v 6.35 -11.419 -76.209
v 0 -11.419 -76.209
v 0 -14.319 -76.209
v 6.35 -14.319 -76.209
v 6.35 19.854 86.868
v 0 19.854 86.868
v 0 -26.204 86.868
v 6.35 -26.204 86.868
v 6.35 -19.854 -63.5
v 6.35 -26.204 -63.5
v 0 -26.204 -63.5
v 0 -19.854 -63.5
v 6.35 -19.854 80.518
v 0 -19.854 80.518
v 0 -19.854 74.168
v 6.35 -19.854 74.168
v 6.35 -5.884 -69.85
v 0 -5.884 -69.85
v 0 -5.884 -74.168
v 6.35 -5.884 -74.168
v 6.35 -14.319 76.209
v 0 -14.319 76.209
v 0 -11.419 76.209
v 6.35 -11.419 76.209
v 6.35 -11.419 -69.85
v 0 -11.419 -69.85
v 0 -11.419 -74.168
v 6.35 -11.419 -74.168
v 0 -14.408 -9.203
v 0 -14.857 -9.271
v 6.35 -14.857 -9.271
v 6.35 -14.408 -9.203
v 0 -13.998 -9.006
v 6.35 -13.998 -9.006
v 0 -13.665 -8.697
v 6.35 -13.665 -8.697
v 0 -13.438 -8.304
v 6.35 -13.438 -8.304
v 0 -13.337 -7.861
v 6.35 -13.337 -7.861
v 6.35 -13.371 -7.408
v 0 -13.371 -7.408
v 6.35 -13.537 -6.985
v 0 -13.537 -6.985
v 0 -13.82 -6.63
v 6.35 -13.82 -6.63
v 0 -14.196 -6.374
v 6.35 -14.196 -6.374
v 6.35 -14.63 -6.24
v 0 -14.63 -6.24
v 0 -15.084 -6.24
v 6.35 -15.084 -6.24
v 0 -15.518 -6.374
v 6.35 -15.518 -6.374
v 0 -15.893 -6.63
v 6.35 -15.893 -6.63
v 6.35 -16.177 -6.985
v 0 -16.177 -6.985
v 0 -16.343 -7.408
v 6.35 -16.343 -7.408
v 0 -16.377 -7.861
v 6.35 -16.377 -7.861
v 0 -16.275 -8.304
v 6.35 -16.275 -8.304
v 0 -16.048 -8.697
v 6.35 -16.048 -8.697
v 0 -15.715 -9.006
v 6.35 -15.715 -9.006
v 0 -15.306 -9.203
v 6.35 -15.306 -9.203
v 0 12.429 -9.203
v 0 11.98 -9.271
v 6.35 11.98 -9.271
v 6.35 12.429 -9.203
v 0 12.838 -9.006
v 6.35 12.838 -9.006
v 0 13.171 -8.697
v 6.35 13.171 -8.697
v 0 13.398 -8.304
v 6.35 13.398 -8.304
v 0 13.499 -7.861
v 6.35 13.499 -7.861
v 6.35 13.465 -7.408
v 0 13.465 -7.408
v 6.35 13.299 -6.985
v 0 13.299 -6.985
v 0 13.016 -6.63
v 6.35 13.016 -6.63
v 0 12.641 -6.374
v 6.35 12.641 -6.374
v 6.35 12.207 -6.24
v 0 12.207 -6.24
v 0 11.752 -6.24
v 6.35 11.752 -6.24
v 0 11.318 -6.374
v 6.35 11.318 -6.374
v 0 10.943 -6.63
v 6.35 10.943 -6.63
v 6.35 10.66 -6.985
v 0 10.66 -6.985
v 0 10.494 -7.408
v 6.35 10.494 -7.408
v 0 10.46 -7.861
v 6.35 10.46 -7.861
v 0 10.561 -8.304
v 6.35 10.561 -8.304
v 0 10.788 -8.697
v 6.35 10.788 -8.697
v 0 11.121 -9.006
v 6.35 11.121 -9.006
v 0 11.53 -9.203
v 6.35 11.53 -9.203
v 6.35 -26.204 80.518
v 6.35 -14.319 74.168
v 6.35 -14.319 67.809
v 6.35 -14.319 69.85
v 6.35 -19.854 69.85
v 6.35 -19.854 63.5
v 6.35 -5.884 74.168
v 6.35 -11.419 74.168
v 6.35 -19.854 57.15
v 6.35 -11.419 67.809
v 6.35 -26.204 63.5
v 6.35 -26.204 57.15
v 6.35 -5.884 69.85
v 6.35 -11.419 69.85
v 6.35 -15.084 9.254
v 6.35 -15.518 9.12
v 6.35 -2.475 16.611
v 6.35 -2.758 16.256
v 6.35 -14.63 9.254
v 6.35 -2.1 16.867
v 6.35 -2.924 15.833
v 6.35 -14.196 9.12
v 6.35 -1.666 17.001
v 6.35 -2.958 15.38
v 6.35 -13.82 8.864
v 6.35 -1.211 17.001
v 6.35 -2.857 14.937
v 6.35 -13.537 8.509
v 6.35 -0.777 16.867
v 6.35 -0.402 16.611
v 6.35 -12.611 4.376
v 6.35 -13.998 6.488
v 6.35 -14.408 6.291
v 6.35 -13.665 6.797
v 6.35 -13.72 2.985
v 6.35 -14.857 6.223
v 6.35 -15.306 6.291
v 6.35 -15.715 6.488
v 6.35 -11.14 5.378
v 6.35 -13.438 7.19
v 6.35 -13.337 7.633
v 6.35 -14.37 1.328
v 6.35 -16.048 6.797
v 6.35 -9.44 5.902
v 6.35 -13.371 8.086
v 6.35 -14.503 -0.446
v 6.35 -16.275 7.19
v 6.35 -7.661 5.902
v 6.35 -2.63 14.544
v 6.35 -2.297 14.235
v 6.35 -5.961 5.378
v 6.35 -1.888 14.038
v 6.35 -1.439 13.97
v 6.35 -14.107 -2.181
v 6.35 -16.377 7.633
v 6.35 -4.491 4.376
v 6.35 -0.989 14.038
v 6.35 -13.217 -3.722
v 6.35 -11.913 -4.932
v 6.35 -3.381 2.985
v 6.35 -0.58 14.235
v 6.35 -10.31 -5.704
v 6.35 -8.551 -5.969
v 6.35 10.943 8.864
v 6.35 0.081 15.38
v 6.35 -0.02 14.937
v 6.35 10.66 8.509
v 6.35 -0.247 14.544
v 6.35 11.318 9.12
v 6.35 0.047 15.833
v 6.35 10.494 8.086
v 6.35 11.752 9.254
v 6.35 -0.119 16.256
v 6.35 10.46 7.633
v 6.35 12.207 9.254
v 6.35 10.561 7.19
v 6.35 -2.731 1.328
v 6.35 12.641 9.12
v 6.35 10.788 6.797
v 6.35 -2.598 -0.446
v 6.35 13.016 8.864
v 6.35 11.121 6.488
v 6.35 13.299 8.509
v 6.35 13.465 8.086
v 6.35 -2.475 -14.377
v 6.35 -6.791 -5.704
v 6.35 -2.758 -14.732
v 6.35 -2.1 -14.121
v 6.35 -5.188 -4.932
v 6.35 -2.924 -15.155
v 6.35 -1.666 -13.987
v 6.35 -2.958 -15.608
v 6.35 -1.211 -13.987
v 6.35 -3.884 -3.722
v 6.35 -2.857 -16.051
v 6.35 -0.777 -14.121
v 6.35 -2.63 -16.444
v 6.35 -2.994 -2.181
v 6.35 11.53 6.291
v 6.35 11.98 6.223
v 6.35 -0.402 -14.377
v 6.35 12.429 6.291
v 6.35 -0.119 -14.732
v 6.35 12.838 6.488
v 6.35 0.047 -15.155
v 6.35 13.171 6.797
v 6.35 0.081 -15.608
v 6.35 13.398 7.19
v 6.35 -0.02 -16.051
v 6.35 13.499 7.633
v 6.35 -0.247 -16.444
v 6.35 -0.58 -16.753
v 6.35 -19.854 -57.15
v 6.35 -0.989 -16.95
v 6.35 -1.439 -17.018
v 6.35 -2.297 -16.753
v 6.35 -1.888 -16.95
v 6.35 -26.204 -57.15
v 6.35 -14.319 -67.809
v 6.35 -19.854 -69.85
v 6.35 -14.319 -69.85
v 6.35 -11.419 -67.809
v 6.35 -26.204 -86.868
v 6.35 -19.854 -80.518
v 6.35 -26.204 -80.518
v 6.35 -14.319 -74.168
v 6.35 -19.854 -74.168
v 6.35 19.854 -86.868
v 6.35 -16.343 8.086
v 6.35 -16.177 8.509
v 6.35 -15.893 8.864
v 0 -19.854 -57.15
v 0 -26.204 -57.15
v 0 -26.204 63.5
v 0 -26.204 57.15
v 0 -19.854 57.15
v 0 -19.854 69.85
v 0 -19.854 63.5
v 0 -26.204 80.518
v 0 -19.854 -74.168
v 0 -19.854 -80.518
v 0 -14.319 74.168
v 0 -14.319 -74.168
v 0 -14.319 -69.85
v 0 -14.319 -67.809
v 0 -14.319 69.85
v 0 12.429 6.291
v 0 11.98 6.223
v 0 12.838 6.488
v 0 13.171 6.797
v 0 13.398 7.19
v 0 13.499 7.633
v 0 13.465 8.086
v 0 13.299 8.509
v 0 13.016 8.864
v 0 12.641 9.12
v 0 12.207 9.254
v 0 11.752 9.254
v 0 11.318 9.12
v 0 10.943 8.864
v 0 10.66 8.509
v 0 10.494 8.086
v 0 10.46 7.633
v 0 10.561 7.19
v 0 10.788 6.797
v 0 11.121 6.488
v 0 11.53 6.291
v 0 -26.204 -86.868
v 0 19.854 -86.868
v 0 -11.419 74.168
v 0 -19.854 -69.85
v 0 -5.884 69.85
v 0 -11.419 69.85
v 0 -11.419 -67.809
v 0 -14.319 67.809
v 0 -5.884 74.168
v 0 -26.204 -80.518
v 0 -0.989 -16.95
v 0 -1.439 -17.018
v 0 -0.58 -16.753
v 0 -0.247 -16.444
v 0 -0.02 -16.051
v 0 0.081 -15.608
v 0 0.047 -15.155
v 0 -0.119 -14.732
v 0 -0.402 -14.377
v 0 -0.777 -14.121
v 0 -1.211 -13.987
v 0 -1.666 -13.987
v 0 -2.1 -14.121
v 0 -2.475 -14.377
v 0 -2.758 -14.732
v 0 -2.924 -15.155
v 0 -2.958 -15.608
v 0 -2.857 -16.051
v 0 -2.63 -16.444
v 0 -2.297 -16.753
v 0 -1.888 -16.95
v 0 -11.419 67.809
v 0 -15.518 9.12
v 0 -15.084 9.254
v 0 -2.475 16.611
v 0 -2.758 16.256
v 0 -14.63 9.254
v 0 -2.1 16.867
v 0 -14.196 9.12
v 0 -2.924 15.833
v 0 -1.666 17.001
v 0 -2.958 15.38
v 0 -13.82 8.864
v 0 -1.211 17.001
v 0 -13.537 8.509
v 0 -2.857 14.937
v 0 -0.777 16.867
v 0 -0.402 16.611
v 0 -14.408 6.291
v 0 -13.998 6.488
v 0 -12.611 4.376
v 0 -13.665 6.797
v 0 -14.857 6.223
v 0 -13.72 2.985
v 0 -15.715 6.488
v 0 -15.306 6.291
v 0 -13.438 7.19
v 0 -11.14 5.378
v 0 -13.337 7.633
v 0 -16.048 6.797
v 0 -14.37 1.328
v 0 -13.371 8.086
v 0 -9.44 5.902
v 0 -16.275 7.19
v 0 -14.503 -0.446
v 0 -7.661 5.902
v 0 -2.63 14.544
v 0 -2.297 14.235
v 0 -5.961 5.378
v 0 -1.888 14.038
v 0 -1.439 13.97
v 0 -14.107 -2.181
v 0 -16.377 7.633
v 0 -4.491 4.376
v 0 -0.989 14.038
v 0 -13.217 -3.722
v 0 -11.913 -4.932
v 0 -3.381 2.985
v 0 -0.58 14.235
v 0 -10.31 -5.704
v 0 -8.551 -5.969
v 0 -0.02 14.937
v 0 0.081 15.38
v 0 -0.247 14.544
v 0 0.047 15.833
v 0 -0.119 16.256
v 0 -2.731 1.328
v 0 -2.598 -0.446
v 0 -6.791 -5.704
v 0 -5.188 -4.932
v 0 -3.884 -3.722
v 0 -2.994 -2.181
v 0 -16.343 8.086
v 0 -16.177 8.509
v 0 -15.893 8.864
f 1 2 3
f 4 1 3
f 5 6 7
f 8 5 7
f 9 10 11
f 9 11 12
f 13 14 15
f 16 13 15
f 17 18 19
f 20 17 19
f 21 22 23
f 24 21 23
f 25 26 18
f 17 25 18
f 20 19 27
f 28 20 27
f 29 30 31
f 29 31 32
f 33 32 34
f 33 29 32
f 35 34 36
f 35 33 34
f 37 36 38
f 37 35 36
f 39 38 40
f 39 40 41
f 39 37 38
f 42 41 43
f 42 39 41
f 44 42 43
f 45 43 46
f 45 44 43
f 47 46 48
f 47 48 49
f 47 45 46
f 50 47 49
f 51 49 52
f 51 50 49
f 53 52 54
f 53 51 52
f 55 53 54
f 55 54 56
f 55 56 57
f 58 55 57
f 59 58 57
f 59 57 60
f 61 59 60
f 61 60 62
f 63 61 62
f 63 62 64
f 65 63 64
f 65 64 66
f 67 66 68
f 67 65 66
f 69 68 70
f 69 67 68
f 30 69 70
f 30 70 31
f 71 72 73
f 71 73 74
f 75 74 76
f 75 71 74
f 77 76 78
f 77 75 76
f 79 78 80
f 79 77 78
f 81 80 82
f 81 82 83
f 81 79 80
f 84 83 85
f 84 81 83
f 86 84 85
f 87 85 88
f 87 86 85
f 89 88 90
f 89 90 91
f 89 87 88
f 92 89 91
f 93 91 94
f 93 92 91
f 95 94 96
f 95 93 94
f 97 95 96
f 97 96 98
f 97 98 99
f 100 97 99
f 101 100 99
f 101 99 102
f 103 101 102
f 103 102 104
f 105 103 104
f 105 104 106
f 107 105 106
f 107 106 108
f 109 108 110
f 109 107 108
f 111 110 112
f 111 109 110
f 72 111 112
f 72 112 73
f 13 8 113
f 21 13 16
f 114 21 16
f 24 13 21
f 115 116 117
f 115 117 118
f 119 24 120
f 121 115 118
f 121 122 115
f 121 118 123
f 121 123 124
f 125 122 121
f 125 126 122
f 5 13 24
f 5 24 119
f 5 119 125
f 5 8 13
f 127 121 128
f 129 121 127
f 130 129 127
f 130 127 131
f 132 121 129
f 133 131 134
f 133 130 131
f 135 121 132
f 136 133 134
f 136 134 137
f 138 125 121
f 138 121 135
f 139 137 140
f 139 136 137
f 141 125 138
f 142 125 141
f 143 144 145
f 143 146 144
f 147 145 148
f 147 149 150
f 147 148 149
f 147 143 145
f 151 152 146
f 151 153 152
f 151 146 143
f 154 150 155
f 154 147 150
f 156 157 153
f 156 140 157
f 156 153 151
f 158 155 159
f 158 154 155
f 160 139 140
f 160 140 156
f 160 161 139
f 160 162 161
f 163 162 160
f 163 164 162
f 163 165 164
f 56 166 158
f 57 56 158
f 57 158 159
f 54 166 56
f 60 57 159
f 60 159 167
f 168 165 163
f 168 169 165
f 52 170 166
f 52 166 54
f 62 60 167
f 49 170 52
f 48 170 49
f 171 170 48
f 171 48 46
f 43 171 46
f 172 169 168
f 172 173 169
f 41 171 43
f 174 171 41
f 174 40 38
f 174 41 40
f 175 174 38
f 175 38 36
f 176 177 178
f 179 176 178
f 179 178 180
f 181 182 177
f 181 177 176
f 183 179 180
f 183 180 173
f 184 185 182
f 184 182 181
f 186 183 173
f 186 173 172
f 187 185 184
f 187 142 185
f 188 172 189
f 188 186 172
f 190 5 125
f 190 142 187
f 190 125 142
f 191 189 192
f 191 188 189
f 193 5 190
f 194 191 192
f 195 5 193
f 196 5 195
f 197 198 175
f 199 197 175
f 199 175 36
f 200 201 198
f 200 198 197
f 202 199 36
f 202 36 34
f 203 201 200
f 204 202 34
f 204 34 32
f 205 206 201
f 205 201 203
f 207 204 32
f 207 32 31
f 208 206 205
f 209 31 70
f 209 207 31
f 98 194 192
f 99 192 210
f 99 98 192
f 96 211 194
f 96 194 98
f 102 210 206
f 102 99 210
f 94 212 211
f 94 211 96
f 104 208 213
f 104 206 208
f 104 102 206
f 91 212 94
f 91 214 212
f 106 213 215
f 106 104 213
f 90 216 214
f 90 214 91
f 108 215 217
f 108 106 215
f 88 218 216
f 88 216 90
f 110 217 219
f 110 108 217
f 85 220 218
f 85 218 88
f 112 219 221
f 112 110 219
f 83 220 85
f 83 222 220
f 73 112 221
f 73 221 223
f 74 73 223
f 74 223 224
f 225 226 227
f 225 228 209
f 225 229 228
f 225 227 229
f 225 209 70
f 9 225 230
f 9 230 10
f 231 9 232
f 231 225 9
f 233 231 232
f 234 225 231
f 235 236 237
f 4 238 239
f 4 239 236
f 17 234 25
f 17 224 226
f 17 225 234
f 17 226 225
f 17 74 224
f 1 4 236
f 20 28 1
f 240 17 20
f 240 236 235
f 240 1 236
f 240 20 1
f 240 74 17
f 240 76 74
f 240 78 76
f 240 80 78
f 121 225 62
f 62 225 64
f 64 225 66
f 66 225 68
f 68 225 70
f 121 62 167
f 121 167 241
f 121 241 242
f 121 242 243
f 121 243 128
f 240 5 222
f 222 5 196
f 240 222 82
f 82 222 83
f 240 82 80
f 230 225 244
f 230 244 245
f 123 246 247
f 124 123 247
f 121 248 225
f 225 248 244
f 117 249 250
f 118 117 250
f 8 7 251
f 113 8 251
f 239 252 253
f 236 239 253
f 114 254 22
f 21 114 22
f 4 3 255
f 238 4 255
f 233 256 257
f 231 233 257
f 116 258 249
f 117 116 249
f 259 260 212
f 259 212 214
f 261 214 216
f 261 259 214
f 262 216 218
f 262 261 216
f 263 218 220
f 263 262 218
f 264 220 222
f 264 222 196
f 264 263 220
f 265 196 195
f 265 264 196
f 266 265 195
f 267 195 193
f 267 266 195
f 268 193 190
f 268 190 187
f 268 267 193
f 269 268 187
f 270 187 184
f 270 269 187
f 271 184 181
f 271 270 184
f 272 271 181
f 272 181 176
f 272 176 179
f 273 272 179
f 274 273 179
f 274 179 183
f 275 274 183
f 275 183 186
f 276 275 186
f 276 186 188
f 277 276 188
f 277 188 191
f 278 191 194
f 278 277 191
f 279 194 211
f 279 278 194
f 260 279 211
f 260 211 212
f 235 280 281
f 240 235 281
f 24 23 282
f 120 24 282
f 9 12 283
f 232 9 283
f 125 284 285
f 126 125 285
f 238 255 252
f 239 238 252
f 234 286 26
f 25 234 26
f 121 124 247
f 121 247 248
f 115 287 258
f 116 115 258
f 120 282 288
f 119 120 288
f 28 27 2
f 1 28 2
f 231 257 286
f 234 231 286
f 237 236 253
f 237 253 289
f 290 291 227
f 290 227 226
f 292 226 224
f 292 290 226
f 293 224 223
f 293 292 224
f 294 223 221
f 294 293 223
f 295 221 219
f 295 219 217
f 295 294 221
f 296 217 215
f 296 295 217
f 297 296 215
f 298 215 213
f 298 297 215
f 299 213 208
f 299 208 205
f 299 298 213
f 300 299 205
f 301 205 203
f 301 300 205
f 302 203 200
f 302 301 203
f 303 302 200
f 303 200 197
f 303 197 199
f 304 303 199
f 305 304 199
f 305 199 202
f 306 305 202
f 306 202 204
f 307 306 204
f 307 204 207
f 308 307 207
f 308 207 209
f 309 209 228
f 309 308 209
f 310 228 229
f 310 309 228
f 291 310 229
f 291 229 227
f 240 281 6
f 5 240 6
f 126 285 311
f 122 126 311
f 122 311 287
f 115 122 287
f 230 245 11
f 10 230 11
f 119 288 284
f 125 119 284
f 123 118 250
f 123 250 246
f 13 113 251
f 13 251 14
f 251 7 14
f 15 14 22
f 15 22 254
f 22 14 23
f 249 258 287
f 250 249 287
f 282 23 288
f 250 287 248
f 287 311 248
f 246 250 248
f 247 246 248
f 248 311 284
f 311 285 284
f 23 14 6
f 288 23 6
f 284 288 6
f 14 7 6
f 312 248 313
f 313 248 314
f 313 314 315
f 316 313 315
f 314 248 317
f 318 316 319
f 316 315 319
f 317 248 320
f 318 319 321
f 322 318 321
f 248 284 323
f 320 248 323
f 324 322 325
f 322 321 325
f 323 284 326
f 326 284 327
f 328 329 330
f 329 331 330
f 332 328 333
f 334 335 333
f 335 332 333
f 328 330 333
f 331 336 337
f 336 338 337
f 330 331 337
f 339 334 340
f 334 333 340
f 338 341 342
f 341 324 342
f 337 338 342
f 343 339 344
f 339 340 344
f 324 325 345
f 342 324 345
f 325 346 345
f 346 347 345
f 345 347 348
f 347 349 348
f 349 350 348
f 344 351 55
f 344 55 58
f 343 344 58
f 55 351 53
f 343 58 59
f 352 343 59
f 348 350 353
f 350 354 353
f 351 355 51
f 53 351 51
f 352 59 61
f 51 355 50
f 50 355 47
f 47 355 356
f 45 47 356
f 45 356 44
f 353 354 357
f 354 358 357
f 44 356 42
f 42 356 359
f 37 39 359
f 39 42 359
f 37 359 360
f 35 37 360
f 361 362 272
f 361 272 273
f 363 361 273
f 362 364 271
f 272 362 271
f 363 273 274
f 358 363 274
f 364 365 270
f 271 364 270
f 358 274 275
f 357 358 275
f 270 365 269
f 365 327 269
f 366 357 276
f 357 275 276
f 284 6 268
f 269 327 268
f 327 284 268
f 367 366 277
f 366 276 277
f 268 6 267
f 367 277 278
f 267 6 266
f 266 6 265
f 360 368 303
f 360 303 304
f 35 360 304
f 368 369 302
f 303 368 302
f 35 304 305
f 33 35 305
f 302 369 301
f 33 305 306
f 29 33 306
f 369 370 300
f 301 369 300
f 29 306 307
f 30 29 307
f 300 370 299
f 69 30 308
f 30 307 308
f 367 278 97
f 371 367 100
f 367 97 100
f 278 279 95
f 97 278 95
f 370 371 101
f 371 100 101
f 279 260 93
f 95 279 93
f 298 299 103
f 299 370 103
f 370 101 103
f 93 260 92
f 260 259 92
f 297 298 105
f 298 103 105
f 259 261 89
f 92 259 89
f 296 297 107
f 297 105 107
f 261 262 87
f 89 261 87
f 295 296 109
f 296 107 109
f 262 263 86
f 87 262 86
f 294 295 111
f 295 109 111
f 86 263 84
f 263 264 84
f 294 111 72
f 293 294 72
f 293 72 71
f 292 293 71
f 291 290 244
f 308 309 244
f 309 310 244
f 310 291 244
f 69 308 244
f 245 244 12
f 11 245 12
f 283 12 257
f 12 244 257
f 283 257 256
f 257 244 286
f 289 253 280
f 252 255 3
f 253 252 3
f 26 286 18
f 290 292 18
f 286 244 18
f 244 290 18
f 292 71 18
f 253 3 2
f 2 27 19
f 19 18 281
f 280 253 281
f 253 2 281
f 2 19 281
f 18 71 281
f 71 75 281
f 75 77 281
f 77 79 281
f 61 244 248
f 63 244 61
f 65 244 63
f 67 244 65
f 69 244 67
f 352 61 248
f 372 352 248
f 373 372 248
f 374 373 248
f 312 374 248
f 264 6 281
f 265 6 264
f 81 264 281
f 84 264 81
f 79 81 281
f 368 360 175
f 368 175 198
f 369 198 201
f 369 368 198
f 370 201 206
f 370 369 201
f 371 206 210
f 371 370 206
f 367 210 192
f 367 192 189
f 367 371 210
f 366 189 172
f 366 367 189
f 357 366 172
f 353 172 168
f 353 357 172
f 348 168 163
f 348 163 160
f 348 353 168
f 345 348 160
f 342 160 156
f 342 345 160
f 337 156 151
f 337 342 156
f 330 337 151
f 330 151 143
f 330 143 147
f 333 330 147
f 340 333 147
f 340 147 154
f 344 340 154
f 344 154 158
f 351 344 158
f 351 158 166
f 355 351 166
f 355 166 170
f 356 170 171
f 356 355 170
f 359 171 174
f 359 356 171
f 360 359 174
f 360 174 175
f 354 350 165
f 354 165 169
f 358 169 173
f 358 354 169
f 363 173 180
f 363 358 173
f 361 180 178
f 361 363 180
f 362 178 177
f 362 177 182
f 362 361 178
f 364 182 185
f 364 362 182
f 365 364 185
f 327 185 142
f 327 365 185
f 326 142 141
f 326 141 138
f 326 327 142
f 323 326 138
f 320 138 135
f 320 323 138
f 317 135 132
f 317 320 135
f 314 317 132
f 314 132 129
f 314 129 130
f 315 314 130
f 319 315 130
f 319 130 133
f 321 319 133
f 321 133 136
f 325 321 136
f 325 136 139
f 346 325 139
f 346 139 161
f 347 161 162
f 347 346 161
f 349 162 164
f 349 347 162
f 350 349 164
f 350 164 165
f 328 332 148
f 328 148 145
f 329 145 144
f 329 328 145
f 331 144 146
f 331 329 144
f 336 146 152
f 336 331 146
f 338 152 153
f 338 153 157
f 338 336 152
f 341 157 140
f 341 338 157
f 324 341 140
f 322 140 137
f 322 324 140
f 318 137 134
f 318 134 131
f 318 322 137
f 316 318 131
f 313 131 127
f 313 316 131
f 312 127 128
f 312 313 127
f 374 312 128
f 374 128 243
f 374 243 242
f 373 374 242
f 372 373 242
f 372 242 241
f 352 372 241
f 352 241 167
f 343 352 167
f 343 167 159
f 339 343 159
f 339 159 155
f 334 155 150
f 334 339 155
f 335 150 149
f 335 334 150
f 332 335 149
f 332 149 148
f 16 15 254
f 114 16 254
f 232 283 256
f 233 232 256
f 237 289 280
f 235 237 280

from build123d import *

# Parameters (mm, degrees)
MOTOR_PLATE_R       = 1.524
MOTOR_PLATE_R_2     = 5.969
BOSS_EXTRUDE1_DEPTH = 6.35


with BuildPart() as part:
    # Motor plate → Boss-Extrude1 (new body)
    with BuildSketch(Plane(origin=(0, 0, 0), x_dir=(0, 0, -1), z_dir=(1, 0, 0))):
        Polygon((-57.15, -19.853598803), (57.15, -19.853598803), (57.15, -26.203598803), (63.5, -26.203598803), (63.5, -19.853598803), (69.85, -19.853598803), (69.85, -14.318598824), (67.809000018, -14.318598824), (67.809000018, -11.418598782), (69.85, -11.418598782), (69.85, -5.883598803), (74.168, -5.883598803), (74.168, -11.418598782), (76.208999982, -11.418598782), (76.208999982, -14.318598824), (74.168, -14.318598824), (74.168, -19.853598803), (80.518, -19.853598803), (80.518, -26.203598803), (86.868, -26.203598803), (86.868, -19.853598803), (86.868, 19.853598803), (57.15, 19.853598803), (-57.15, 19.853598803), (-86.868, 19.853598803), (-86.868, -19.853598803), (-86.868, -26.203598803), (-80.518, -26.203598803), (-80.518, -19.853598803), (-74.168, -19.853598803), (-74.168, -14.318598824), (-76.208999982, -14.318598824), (-76.208999982, -11.418598782), (-74.168, -11.418598782), (-74.168, -5.883598803), (-69.85, -5.883598803), (-69.85, -11.418598782), (-67.809000018, -11.418598782), (-67.809000018, -14.318598824), (-69.85, -14.318598824), (-69.85, -19.853598803), (-63.5, -19.853598803), (-63.5, -26.203598803), (-57.15, -26.203598803), align=None)
        with Locations((-7.747, -14.856796409)):
            Circle(MOTOR_PLATE_R, mode=Mode.SUBTRACT)
        with Locations((0, -8.550598803)):
            Circle(MOTOR_PLATE_R_2, mode=Mode.SUBTRACT)
        with Locations((7.747, -14.856796409)):
            Circle(MOTOR_PLATE_R, mode=Mode.SUBTRACT)
        with Locations((-15.494, -1.438598803)):
            Circle(MOTOR_PLATE_R, mode=Mode.SUBTRACT)
        with Locations((-7.747, 11.979598803)):
            Circle(MOTOR_PLATE_R, mode=Mode.SUBTRACT)
        with Locations((15.494, -1.438598803)):
            Circle(MOTOR_PLATE_R, mode=Mode.SUBTRACT)
        with Locations((7.747, 11.979598803)):
            Circle(MOTOR_PLATE_R, mode=Mode.SUBTRACT)
    extrude(amount=BOSS_EXTRUDE1_DEPTH)


solid = part.part
